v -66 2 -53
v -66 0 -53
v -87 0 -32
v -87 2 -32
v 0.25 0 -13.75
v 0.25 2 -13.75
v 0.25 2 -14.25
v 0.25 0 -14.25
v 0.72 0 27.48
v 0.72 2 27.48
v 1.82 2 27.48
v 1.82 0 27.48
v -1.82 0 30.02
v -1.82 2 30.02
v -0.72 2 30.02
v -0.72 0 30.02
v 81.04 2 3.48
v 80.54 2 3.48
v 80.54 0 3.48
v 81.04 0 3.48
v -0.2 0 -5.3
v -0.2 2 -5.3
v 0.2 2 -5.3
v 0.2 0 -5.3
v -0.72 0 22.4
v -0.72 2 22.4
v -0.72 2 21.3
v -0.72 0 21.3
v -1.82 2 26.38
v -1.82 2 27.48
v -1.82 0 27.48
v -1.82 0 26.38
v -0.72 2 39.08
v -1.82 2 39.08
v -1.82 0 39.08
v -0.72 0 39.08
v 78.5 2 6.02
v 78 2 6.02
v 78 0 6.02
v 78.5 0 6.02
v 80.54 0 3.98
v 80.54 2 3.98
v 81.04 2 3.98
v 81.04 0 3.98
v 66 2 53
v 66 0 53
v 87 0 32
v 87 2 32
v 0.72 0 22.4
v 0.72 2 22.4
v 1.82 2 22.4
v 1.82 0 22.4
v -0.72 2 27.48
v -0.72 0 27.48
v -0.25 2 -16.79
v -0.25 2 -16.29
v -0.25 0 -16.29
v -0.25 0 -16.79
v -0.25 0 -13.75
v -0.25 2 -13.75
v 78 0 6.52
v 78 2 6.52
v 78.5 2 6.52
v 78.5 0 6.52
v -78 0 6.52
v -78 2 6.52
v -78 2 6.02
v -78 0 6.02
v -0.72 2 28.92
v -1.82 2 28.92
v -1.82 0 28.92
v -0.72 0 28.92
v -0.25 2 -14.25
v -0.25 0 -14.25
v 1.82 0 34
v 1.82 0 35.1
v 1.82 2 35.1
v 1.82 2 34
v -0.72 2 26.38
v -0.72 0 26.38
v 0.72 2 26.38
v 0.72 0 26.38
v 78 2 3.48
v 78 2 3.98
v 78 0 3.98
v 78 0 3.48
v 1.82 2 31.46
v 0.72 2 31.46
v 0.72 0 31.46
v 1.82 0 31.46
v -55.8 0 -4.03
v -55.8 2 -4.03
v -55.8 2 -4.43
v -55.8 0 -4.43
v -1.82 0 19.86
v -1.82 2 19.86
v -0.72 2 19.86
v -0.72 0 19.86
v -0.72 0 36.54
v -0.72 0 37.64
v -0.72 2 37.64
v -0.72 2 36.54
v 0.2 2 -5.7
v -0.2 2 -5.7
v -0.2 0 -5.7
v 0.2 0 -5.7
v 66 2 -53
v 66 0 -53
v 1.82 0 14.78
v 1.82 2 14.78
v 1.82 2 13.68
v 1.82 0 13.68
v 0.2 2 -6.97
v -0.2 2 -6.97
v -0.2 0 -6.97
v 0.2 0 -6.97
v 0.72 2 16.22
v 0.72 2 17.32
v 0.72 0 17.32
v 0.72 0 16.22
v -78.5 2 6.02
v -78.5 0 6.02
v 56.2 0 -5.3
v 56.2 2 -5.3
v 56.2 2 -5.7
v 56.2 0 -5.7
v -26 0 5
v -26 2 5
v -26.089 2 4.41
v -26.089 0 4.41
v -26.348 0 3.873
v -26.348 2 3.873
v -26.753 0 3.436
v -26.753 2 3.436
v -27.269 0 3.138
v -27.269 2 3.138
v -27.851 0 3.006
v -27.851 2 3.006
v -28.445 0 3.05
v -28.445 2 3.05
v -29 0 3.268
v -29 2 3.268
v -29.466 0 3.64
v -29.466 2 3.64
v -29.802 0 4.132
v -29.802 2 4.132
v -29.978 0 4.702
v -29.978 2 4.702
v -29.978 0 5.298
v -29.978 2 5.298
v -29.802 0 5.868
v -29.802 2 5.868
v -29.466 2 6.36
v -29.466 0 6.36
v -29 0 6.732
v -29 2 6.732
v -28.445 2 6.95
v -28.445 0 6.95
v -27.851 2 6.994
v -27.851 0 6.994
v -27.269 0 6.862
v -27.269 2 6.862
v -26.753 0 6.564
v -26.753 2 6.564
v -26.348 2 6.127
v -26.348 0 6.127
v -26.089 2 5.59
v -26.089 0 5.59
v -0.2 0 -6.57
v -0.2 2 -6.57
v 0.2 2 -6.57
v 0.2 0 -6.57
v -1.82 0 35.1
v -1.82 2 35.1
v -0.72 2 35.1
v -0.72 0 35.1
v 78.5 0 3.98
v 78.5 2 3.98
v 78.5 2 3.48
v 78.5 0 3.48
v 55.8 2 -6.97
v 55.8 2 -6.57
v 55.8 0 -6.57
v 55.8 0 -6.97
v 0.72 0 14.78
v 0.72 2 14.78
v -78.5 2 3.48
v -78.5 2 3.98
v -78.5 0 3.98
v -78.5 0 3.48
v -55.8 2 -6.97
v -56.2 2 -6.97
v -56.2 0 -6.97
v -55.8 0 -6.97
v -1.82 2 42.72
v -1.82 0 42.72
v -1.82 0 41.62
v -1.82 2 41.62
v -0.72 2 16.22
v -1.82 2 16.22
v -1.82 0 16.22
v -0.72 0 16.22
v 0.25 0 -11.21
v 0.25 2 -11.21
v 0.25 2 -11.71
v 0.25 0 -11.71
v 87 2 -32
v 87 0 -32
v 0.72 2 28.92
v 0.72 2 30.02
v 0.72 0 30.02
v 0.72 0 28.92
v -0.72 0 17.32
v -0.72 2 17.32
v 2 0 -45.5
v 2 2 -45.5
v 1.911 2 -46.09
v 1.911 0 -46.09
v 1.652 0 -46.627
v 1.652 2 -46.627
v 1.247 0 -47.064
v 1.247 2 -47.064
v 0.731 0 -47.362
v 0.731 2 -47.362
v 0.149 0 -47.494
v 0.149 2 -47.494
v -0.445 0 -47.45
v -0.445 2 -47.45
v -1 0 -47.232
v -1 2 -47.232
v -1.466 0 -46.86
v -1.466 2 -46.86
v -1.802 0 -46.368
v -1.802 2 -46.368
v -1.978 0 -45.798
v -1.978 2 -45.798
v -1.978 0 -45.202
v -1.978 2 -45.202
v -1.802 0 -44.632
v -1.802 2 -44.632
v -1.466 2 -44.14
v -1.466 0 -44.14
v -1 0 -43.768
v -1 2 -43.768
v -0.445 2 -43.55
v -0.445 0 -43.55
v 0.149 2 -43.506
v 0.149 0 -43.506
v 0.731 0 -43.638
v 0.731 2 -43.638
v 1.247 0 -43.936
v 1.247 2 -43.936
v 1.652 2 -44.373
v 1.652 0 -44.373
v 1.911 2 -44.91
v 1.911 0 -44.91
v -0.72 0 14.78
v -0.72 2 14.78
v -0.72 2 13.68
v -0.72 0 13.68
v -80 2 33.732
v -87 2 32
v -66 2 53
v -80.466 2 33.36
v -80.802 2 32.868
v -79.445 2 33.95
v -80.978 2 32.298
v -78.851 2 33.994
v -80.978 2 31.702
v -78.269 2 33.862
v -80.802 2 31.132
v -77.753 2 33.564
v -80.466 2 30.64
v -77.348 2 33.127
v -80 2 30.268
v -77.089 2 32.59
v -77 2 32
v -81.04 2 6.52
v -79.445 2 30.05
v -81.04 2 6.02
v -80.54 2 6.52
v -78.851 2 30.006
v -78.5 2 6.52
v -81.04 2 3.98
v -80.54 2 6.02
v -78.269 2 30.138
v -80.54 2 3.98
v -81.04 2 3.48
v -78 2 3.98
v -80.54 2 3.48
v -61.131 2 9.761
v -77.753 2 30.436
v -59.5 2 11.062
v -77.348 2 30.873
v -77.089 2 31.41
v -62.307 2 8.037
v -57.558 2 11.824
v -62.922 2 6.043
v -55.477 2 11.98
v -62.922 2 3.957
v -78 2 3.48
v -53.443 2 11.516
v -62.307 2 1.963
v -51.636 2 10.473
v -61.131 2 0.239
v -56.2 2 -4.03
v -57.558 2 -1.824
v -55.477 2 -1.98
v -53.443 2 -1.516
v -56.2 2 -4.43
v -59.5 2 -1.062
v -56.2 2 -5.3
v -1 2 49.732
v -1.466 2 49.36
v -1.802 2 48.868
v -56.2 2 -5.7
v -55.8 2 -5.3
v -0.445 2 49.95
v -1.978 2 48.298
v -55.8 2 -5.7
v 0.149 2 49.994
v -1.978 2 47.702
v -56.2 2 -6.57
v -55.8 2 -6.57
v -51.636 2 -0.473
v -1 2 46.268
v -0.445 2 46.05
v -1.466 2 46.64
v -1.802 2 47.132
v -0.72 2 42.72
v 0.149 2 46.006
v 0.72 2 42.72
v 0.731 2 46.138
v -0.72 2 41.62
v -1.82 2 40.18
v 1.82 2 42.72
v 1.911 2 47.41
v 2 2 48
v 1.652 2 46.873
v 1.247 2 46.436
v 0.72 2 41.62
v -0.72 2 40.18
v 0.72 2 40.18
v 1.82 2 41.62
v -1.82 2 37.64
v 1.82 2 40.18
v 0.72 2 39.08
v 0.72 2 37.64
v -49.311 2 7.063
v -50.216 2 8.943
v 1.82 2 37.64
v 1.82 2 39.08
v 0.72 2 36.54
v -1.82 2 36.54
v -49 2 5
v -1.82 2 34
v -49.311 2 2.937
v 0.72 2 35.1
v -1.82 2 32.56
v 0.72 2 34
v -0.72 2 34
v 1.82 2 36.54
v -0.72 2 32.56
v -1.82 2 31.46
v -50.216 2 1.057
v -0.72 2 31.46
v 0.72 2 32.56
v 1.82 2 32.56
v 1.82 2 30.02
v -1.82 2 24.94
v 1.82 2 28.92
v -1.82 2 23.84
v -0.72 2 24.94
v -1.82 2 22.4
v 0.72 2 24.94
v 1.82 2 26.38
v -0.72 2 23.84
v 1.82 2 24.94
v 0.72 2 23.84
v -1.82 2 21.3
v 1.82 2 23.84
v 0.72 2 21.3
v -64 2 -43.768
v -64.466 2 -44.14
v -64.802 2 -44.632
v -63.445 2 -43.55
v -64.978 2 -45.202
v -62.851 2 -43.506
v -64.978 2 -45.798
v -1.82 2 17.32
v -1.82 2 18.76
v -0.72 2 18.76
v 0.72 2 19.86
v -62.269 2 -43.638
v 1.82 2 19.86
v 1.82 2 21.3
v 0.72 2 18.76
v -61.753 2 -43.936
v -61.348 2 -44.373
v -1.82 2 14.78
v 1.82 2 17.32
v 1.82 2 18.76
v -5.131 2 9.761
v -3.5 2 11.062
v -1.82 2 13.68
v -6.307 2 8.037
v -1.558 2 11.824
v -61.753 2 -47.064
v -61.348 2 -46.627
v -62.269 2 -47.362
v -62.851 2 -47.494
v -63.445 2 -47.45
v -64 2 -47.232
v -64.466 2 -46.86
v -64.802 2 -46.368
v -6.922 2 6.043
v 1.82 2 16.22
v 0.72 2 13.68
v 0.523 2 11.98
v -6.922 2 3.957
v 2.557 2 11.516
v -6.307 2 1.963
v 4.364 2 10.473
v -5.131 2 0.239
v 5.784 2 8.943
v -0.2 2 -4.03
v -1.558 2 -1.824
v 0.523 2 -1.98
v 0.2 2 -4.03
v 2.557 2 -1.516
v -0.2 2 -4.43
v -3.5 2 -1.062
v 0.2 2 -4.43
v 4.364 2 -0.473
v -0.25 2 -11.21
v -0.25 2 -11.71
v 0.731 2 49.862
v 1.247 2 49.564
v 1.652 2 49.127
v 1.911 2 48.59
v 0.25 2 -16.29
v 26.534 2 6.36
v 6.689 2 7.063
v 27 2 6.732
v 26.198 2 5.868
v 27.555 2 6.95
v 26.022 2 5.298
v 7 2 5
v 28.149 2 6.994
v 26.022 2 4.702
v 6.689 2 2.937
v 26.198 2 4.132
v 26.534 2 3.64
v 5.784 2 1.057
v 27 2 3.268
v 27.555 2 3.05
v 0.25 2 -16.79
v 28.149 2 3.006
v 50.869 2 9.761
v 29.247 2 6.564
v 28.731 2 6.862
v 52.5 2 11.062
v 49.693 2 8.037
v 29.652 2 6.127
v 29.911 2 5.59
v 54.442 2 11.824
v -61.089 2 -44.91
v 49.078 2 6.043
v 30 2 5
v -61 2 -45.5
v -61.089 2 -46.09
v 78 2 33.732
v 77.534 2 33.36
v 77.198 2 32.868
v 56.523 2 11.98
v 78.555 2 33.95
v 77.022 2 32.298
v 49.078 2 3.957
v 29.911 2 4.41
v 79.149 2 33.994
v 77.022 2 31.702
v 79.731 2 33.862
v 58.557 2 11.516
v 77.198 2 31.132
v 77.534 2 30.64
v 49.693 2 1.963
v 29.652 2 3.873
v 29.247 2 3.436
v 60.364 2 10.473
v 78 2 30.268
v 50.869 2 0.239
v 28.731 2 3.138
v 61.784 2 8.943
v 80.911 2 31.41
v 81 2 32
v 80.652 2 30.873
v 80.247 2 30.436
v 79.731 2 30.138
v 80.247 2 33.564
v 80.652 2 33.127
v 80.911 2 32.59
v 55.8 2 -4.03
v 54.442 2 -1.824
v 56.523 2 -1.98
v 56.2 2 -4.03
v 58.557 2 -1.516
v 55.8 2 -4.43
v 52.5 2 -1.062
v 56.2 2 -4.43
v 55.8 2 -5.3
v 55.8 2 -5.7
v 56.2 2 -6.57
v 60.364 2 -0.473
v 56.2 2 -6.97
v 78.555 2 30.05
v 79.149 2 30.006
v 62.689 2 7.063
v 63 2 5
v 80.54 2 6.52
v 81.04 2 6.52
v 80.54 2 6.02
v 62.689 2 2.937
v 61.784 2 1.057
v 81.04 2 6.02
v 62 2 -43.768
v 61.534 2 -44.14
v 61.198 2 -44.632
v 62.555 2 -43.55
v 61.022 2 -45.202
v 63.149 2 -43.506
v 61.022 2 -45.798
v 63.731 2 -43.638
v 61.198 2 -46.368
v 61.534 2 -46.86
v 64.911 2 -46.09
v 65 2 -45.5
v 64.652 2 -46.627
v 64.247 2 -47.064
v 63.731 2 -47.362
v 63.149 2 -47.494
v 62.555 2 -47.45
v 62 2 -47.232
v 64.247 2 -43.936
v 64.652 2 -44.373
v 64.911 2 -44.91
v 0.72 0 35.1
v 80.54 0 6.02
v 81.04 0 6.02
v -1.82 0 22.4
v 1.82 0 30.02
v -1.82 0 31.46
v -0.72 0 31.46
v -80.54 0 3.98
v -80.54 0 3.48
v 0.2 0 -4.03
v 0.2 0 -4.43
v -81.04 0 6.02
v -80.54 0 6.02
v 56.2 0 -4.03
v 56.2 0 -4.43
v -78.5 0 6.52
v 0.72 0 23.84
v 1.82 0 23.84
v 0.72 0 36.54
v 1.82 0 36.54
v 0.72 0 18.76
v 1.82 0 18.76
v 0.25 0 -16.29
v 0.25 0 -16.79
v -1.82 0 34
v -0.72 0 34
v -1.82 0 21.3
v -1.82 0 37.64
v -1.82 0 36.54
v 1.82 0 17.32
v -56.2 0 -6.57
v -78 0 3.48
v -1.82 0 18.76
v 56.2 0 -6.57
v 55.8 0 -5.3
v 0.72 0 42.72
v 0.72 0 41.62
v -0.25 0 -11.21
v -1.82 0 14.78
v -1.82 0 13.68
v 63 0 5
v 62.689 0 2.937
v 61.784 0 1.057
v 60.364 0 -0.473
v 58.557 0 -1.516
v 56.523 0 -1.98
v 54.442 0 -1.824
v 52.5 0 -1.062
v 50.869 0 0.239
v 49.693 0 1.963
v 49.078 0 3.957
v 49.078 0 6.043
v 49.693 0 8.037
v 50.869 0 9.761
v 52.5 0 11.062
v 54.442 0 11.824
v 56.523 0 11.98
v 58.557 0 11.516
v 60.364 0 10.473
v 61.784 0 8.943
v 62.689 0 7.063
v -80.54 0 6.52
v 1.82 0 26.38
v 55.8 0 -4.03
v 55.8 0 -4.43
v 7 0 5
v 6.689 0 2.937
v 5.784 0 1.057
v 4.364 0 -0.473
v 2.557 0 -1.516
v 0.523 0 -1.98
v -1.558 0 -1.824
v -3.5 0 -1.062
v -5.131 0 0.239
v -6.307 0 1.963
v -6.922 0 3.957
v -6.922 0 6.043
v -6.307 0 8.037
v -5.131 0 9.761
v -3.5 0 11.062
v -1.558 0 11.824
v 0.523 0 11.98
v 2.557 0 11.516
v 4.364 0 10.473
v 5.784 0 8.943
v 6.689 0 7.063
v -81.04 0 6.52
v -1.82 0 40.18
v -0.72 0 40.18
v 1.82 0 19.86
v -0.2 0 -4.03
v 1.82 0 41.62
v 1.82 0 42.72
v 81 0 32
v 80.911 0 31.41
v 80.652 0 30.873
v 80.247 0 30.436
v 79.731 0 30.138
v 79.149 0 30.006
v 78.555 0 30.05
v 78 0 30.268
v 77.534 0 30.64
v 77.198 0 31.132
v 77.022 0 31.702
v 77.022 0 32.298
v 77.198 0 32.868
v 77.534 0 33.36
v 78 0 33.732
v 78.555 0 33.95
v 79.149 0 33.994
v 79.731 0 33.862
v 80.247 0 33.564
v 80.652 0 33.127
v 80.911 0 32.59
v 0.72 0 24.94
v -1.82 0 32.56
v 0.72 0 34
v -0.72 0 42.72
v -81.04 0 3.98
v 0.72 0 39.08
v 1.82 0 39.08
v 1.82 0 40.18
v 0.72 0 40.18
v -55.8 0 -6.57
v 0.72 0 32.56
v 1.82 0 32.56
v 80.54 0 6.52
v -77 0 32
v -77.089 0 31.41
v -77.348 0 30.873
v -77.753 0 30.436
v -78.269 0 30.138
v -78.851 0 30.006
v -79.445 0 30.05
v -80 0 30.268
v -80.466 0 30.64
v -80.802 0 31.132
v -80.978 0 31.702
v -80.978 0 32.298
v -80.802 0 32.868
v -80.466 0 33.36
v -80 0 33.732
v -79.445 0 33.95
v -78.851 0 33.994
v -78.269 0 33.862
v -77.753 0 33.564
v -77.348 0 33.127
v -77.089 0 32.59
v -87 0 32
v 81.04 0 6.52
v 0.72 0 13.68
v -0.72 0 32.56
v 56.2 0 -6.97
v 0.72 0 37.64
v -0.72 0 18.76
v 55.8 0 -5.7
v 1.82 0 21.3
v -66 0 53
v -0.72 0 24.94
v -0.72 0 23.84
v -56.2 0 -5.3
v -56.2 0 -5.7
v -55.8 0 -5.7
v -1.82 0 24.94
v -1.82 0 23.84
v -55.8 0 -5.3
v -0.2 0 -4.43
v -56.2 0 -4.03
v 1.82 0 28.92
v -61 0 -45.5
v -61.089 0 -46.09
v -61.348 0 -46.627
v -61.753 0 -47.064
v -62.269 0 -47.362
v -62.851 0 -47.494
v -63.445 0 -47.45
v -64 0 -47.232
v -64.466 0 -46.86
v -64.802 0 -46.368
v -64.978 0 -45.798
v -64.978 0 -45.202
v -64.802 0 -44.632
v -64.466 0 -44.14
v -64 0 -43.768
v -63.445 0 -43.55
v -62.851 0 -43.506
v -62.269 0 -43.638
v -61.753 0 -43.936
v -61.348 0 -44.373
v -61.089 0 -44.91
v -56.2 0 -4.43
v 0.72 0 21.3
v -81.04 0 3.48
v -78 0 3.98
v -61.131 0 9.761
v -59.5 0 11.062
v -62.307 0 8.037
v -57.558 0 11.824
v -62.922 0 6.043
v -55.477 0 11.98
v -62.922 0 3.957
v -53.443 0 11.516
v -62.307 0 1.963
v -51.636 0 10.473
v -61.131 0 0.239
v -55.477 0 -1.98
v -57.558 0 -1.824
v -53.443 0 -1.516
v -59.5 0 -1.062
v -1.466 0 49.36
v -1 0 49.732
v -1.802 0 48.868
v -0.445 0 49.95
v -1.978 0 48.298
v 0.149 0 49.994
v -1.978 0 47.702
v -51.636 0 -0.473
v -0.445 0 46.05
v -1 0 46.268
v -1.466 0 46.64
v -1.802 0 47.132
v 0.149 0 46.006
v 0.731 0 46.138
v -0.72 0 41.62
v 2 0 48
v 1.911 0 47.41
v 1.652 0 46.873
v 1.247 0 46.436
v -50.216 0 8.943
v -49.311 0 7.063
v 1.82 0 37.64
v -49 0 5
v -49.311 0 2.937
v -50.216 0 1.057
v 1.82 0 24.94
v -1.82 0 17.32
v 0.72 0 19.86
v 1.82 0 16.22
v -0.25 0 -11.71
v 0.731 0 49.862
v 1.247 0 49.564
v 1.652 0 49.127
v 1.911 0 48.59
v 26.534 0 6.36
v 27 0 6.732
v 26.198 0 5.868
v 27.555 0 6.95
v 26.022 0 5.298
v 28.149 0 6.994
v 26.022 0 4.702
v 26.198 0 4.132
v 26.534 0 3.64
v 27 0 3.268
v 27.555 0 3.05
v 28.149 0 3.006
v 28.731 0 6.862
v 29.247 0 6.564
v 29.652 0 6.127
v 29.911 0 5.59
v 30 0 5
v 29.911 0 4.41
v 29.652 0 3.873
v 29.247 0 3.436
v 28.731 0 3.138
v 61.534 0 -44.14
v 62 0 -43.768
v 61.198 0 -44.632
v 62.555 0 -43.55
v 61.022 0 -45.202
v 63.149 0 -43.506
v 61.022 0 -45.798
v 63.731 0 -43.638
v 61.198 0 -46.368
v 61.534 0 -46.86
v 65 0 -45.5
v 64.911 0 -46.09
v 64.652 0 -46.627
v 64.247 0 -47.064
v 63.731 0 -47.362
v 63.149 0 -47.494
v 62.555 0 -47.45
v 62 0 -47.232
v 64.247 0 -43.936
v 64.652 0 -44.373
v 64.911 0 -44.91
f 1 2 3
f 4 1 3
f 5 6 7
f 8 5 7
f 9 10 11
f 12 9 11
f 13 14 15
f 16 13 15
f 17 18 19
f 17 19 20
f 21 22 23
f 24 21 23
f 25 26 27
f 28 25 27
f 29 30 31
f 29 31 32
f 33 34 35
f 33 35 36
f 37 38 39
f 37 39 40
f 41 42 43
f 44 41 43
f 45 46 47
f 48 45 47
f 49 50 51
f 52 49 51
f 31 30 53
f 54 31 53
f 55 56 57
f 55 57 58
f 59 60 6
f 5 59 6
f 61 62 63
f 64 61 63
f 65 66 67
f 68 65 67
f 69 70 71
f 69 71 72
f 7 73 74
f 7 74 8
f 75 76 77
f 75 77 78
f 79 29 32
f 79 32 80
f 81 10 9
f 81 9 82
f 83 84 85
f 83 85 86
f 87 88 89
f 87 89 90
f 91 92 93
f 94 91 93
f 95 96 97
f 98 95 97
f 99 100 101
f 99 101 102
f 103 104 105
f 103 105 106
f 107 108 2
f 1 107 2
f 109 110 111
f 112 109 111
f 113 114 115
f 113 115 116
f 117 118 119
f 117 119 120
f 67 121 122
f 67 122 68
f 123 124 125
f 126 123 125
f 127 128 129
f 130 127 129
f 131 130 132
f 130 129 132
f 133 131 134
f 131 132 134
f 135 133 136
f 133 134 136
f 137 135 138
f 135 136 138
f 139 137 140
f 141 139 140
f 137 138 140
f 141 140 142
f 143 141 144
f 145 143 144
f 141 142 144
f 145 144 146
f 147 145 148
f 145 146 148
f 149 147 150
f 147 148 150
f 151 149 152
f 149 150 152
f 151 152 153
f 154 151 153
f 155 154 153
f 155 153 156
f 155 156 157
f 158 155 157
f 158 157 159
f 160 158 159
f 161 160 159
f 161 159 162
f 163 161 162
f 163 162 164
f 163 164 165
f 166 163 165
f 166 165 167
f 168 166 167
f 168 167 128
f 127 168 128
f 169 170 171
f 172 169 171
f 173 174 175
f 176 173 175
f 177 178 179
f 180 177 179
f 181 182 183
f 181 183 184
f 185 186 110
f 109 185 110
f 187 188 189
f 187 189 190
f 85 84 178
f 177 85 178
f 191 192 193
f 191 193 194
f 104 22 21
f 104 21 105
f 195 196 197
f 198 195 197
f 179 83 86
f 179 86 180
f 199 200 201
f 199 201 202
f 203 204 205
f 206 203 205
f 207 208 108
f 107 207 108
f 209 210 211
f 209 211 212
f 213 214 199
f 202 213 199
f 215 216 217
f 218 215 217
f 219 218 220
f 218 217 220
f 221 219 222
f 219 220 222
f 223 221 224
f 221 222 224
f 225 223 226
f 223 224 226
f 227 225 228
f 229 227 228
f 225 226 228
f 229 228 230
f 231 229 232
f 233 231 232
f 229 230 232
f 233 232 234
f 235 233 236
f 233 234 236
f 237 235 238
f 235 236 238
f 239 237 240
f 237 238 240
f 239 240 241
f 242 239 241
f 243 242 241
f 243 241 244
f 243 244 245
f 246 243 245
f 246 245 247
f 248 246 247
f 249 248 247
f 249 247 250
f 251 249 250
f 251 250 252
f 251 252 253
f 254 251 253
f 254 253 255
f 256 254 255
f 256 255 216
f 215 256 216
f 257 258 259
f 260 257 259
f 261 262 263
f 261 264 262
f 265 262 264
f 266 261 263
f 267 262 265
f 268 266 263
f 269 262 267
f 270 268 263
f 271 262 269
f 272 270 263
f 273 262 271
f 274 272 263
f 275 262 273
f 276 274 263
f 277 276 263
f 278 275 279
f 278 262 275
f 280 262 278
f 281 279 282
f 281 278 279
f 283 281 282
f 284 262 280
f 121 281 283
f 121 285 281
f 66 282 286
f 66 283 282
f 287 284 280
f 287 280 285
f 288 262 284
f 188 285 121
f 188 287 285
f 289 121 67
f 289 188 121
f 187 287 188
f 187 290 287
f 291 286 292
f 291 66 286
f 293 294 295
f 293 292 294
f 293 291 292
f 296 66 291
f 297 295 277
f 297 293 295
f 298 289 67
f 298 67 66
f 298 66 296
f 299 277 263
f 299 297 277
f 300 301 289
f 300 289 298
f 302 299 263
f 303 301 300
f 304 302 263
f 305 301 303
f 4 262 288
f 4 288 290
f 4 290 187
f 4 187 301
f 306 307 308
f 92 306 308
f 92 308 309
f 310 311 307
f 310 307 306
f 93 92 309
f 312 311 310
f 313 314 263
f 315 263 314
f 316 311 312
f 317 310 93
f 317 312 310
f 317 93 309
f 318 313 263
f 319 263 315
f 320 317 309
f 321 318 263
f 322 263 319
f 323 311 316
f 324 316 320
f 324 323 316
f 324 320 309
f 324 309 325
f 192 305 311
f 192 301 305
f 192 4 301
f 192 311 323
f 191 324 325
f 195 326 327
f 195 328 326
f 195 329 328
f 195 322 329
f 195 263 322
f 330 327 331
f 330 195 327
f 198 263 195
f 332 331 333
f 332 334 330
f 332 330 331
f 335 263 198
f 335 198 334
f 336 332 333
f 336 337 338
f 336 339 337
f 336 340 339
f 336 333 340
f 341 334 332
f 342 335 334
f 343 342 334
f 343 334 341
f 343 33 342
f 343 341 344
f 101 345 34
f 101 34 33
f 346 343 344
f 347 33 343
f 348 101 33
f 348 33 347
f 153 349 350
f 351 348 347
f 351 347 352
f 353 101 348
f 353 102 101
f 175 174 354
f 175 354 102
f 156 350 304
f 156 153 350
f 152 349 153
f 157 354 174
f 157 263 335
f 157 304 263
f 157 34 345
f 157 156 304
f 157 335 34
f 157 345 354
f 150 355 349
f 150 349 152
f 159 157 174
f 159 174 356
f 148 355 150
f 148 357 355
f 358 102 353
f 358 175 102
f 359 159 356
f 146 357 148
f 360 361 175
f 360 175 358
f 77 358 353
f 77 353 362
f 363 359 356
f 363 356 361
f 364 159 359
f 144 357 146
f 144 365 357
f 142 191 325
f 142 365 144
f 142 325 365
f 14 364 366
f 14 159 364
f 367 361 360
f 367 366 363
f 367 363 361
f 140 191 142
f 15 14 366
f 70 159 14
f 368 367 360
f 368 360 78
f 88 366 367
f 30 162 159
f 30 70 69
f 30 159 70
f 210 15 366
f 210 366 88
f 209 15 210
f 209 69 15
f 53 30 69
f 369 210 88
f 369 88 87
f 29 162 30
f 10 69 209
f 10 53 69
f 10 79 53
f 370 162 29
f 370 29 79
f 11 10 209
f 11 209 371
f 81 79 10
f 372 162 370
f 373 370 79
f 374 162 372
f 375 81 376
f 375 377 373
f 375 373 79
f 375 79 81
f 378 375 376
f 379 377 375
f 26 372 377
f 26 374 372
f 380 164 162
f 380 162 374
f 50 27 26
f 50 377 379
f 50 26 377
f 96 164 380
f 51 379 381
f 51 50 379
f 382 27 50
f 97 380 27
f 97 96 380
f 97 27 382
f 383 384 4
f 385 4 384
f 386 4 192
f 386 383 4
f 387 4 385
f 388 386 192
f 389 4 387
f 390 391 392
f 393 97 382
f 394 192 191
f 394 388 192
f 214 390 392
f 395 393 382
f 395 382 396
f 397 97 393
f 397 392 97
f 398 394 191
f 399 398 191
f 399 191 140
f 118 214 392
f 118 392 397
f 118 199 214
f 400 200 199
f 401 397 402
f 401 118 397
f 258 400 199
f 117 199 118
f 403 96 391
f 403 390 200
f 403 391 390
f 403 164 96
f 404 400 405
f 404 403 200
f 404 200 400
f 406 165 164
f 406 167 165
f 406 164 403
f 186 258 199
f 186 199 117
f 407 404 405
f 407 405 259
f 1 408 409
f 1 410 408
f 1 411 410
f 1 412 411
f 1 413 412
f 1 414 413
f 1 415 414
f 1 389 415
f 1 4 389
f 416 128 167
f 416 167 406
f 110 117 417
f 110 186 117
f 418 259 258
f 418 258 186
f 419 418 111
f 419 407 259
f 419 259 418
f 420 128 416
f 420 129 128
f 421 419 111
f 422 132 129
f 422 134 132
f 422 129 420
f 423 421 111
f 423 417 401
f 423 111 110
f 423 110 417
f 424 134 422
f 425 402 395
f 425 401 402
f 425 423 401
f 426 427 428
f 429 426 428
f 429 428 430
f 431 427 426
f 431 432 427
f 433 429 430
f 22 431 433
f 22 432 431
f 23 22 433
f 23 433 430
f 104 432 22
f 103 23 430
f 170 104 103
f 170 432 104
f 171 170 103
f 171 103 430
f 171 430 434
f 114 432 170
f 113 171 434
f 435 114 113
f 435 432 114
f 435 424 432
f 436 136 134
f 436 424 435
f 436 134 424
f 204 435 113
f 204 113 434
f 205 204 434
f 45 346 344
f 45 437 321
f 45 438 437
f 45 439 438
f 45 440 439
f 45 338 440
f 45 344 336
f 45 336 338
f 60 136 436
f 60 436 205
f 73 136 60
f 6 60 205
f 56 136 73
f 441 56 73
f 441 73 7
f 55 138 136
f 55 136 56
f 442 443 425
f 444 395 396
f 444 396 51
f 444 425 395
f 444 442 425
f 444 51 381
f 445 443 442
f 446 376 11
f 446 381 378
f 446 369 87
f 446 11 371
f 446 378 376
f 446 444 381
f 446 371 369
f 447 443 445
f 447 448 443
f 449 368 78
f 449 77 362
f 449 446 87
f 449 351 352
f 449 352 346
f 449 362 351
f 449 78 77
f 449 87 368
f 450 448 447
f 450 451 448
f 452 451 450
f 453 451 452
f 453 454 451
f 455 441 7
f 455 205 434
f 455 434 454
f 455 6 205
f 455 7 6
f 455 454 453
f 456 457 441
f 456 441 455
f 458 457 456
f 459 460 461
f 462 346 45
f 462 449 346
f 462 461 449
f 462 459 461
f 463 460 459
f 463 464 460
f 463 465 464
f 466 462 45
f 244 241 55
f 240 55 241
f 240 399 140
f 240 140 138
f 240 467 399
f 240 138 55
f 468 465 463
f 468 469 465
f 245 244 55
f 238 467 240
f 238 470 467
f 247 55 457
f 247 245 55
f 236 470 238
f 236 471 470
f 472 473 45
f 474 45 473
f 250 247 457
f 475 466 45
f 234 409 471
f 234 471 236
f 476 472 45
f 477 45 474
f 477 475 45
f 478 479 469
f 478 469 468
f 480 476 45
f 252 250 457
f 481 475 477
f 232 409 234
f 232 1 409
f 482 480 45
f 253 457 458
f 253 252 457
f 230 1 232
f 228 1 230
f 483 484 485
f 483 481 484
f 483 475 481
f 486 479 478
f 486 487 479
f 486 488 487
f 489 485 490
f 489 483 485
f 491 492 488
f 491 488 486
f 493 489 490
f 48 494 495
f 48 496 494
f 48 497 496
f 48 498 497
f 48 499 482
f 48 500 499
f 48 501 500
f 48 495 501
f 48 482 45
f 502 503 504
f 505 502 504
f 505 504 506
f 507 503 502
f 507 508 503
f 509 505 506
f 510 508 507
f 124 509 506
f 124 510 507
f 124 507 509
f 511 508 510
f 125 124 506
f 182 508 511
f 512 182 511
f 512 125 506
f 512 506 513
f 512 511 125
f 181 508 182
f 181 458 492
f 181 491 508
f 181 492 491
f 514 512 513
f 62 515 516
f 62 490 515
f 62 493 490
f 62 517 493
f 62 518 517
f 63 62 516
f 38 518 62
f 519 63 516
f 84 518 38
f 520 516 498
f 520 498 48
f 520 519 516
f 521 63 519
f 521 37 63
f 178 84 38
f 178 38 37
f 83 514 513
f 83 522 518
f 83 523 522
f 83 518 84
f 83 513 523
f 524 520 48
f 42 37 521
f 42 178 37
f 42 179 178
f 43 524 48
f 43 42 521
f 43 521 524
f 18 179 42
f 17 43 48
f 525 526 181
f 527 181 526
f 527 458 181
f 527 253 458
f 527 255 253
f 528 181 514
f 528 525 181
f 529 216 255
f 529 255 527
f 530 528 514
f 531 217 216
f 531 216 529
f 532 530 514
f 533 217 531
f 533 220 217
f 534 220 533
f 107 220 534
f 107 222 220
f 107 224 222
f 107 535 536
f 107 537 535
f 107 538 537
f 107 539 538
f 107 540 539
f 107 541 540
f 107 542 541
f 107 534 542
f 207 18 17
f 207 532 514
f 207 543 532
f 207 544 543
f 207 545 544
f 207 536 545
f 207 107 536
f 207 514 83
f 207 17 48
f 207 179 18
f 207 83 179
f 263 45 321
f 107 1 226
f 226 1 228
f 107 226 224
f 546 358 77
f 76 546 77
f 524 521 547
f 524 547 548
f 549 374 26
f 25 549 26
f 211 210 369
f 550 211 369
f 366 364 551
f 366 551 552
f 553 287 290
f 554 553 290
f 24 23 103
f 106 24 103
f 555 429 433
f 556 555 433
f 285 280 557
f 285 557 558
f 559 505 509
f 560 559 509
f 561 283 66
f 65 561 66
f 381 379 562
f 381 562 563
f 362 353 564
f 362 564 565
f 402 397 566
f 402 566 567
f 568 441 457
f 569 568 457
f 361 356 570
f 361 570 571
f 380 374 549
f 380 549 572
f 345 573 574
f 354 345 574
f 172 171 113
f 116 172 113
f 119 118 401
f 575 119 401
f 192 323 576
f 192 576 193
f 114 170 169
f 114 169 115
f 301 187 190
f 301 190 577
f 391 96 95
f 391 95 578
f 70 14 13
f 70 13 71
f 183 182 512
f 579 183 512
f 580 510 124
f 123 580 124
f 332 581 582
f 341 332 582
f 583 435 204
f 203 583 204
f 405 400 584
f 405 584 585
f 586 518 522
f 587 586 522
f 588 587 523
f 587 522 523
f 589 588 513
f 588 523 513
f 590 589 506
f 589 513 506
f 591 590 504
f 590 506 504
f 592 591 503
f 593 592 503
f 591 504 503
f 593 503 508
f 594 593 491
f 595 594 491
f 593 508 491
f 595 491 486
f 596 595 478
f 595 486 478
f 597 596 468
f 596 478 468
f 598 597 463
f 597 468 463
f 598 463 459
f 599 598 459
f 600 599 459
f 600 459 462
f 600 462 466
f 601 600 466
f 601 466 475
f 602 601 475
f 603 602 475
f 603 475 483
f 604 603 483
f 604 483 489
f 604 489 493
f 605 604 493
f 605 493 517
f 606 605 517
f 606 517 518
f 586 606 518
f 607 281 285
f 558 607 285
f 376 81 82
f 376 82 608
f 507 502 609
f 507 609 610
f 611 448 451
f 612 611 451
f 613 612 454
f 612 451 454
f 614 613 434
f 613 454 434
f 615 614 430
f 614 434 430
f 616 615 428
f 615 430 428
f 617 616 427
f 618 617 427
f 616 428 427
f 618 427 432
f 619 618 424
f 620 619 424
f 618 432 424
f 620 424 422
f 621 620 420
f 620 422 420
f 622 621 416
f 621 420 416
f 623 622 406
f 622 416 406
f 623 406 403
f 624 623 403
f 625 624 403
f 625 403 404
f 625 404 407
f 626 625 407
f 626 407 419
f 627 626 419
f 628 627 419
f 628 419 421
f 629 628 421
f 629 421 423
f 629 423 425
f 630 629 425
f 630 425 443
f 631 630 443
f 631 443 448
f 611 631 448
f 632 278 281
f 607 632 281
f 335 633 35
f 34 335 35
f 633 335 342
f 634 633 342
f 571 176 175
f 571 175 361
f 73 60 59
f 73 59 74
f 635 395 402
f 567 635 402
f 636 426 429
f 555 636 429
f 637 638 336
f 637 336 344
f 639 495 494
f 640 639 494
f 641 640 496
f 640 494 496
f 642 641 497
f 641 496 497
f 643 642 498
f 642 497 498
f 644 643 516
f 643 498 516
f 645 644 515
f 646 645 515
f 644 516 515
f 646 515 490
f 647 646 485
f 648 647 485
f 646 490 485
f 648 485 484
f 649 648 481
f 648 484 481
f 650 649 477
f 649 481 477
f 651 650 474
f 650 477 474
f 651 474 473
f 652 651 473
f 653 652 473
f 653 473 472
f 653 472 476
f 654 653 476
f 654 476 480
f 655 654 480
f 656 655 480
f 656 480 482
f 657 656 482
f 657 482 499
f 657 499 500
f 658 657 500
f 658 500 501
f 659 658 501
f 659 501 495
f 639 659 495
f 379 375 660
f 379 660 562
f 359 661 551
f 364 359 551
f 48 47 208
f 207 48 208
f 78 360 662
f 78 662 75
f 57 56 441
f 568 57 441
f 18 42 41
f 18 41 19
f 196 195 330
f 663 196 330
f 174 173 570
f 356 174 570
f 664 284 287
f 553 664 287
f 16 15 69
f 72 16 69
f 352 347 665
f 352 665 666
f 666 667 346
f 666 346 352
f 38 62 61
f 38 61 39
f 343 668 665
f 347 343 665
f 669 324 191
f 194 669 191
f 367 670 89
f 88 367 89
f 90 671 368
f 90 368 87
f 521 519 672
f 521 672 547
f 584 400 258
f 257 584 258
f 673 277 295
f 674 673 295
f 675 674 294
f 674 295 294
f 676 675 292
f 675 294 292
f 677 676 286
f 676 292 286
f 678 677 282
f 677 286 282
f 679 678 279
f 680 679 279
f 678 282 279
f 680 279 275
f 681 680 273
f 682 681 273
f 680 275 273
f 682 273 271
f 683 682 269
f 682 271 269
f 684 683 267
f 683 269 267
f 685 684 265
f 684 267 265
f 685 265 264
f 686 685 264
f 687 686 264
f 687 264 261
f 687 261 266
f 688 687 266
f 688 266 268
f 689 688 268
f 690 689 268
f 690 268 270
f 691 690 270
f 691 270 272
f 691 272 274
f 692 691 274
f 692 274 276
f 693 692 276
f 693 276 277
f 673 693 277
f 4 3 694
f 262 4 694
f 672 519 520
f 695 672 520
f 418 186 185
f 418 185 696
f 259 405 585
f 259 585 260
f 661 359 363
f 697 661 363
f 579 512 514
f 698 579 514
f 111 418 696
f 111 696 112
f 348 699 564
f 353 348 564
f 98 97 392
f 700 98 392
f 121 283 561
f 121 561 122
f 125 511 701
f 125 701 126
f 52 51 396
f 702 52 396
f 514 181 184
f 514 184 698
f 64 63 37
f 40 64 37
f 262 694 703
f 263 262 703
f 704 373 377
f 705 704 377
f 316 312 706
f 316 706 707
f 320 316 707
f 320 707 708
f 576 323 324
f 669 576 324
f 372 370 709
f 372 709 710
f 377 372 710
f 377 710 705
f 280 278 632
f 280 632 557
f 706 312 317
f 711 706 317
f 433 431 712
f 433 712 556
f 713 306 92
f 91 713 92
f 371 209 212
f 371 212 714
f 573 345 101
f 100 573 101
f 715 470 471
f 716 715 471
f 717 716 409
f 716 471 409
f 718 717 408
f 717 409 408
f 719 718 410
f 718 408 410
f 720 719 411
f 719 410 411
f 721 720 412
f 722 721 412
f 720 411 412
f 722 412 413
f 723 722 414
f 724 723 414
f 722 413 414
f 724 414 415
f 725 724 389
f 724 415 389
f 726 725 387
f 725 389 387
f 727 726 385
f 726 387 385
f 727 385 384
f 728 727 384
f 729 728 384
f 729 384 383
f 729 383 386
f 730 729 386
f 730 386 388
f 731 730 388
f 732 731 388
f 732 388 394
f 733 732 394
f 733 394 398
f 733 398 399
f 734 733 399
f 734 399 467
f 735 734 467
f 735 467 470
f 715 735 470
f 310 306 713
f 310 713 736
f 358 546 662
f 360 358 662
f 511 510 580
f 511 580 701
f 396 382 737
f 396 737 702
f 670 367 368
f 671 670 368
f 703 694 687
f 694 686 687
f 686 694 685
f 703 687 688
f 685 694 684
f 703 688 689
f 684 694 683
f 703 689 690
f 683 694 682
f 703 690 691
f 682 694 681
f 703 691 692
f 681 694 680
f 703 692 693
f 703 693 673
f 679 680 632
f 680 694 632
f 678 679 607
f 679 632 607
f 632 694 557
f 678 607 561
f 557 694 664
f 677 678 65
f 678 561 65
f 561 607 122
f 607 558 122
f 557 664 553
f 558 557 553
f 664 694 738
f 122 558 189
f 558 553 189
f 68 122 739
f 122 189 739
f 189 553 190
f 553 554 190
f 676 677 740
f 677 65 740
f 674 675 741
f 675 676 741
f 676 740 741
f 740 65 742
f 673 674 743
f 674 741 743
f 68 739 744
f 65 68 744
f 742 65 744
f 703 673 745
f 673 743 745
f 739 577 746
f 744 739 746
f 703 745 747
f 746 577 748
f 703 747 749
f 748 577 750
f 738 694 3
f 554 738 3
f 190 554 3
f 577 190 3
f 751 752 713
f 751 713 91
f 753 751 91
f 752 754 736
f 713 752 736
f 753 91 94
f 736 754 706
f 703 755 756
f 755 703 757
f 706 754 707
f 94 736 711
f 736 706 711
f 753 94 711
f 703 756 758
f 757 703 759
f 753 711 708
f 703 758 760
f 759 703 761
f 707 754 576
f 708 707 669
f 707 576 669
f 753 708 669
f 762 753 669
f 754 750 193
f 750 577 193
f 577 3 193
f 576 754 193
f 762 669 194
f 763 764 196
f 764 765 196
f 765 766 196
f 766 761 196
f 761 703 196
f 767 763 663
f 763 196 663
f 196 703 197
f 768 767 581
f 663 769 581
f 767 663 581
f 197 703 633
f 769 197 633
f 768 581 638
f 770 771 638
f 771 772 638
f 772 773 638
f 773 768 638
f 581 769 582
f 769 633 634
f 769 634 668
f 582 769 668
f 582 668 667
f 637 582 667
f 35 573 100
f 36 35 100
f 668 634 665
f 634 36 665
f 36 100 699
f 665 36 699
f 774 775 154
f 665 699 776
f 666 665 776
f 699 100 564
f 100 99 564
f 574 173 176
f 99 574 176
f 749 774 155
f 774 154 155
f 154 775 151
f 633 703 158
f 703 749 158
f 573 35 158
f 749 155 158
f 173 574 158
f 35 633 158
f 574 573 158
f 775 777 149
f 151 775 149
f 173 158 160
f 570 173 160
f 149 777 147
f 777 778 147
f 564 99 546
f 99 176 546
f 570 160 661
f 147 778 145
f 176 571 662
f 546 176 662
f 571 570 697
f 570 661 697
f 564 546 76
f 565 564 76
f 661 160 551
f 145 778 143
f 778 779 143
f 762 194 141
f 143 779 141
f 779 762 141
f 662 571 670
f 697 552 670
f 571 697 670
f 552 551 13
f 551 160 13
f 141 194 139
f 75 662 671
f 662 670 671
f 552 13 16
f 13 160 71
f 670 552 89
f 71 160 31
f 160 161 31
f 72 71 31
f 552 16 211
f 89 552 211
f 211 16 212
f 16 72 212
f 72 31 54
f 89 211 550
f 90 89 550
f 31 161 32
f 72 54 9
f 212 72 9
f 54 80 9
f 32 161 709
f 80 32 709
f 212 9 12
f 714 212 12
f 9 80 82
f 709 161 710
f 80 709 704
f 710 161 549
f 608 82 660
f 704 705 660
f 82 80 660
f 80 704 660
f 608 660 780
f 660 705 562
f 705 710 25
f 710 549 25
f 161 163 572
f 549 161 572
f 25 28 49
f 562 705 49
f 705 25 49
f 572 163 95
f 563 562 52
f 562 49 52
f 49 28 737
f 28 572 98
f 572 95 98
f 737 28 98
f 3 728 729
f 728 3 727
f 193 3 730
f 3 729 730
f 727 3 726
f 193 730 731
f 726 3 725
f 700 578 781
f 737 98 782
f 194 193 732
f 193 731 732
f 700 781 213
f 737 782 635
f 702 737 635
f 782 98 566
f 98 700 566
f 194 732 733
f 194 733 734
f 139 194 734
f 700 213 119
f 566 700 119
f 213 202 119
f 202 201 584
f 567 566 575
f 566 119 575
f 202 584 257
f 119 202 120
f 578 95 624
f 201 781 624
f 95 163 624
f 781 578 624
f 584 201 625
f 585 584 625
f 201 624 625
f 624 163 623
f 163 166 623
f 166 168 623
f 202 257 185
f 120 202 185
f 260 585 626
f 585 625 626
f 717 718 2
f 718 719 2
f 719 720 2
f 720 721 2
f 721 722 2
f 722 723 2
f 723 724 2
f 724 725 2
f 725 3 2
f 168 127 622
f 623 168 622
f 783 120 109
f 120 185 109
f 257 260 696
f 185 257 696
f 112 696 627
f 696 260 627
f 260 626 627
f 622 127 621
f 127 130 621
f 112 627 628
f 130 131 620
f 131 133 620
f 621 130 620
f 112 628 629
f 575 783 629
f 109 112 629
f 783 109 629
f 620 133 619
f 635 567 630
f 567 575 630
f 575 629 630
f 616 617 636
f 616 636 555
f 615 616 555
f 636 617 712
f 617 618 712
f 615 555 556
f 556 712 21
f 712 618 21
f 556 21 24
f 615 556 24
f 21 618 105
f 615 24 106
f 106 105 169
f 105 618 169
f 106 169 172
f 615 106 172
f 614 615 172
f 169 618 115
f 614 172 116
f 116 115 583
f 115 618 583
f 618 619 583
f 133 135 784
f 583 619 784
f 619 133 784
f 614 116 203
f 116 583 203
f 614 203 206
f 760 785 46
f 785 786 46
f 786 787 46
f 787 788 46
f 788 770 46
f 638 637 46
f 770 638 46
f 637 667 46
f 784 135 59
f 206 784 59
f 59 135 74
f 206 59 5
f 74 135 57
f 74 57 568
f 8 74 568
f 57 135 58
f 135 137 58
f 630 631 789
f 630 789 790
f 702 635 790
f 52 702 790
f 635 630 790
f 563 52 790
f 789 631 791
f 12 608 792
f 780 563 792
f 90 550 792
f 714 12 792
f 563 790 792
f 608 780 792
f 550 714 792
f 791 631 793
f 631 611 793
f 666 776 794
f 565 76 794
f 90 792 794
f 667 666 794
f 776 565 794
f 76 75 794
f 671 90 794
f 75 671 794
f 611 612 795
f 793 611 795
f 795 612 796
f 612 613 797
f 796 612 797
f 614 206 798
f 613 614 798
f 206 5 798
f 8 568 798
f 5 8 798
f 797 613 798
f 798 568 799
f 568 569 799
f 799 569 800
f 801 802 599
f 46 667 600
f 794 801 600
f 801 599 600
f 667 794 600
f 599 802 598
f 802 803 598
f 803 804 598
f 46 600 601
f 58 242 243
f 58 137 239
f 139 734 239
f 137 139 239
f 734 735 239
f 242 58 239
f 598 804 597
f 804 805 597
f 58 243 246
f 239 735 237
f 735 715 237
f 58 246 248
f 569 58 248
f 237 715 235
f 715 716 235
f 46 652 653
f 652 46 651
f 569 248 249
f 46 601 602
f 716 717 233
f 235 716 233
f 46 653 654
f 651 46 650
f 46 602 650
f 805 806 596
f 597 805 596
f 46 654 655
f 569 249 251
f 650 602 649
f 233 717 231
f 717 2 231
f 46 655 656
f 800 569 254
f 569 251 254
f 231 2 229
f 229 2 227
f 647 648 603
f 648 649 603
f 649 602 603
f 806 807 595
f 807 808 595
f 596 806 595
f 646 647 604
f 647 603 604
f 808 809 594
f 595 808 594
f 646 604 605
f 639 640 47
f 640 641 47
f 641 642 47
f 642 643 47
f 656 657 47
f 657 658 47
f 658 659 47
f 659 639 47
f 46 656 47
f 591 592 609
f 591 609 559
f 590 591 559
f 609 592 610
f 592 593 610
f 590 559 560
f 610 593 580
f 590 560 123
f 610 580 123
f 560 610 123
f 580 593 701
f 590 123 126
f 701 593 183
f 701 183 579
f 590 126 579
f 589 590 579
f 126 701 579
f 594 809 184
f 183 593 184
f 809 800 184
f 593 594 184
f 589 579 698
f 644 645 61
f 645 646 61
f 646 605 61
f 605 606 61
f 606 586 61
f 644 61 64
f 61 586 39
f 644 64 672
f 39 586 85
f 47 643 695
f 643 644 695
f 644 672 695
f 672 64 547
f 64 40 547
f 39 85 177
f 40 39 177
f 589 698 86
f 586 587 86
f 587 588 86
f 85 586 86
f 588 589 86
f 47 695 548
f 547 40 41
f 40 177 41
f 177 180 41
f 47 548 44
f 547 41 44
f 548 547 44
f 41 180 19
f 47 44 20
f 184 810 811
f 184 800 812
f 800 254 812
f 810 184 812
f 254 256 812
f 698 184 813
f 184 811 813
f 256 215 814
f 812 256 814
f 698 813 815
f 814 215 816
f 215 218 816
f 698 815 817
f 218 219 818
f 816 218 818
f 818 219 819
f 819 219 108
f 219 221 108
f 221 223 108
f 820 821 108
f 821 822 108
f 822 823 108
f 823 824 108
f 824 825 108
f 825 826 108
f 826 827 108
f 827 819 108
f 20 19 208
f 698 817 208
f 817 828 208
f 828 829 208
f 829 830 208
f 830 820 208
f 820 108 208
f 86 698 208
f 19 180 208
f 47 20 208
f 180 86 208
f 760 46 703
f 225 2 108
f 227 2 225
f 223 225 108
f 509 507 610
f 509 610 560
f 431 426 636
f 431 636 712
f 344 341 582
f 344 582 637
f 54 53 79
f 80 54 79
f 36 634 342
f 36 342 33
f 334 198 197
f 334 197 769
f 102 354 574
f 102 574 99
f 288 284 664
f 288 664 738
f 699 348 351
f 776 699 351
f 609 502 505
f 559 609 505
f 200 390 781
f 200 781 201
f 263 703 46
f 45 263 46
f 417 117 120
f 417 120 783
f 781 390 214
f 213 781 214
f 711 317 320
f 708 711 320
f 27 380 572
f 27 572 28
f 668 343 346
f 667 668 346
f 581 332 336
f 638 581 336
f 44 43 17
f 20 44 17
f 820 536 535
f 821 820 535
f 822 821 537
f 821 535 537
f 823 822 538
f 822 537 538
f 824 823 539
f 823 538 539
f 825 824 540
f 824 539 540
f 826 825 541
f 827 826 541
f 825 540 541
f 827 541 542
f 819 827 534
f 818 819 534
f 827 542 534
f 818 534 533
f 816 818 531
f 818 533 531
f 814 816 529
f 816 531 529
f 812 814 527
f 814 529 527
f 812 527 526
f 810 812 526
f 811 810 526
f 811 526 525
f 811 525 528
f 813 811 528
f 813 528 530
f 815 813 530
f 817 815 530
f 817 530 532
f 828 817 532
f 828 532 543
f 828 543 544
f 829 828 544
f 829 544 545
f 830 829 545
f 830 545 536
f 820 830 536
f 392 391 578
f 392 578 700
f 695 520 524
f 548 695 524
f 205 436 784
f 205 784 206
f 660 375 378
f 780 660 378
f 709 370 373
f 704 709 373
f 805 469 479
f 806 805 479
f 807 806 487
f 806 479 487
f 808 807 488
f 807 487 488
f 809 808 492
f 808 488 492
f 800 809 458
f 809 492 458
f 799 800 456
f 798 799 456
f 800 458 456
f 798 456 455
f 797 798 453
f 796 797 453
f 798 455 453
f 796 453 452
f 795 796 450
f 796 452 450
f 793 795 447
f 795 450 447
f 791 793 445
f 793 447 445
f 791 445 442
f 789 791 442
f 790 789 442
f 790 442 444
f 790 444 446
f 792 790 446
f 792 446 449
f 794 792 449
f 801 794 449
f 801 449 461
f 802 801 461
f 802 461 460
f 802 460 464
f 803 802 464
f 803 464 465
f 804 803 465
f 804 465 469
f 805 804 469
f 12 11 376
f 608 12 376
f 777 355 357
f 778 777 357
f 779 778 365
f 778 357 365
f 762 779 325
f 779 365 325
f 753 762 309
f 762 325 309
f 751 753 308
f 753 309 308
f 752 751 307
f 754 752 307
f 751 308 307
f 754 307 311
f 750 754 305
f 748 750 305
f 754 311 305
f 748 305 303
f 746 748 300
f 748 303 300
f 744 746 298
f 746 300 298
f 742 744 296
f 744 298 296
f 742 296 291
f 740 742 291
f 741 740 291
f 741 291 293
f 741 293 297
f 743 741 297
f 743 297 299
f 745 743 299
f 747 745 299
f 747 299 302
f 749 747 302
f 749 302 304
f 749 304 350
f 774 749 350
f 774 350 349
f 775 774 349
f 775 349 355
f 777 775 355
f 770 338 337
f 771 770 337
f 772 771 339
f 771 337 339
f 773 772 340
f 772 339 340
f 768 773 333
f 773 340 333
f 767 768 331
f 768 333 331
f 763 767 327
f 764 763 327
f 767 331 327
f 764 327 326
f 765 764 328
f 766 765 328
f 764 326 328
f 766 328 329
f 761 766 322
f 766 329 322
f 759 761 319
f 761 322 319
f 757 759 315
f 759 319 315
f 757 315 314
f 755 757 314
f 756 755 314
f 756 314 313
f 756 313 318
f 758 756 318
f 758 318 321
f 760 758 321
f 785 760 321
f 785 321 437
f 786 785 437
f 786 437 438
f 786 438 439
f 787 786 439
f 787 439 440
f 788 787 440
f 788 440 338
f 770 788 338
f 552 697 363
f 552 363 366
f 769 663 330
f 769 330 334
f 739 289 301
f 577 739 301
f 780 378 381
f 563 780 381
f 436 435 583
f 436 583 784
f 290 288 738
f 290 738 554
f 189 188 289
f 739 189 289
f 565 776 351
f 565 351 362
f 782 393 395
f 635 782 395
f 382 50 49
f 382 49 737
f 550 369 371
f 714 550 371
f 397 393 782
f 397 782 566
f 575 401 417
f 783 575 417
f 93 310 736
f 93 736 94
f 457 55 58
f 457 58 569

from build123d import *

# Parameters (mm, degrees)
EXTRUDE_1_DEPTH     = 2
SKETCH_7_R          = 7
CUT_EXTRUDE_3_DEPTH = 3
SKETCH_2_R          = 2
CUT_EXTRUDE_4_DEPTH = 3
SKETCH_8_W          = 1.1
SKETCH_8_H          = 1.1
CUT_EXTRUDE_5_DEPTH = 10
SKETCH_9_W          = 0.5
SKETCH_9_H          = 0.5
SKETCH_9_W_2        = 0.4
SKETCH_9_H_2        = 0.4
CUT_EXTRUDE_6_DEPTH = 10


with BuildPart() as part:
    # 草图1 → 凸台-拉伸1 (new body)
    with BuildSketch(Plane(origin=(0, 0, 0), x_dir=(1, 0, 0), z_dir=(0, 1, 0))):
        Polygon((-66, 53), (-87, 32), (-87, -32), (-66, -53), (66, -53), (87, -32), (87, 32), (66, 53), align=None)
    extrude(amount=EXTRUDE_1_DEPTH)

    # 草图7 → 切除-拉伸3 (cut, through all)
    with BuildSketch(Plane(origin=(0, 2, 0), x_dir=(1, 0, 0), z_dir=(0, 1, 0))):
        with Locations((-56, -5)):
            Circle(SKETCH_7_R)
        with Locations((0, -5)):
            Circle(SKETCH_7_R)
        with Locations((56, -5)):
            Circle(SKETCH_7_R)
    extrude(amount=-CUT_EXTRUDE_3_DEPTH, mode=Mode.SUBTRACT)

    # 草图2 → 切除-拉伸4 (cut, through all)
    with BuildSketch(Plane(origin=(0, 2, 0), x_dir=(1, 0, 0), z_dir=(0, 1, 0))):
        with Locations((-63, 45.5)):
            Circle(SKETCH_2_R)
        with Locations((0, 45.5)):
            Circle(SKETCH_2_R)
        with Locations((63, 45.5)):
            Circle(SKETCH_2_R)
        with Locations((28, -5)):
            Circle(SKETCH_2_R)
        with Locations((-28, -5)):
            Circle(SKETCH_2_R)
        with Locations((-79, -32)):
            Circle(SKETCH_2_R)
        with Locations((0, -48)):
            Circle(SKETCH_2_R)
        with Locations((79, -32)):
            Circle(SKETCH_2_R)
    extrude(amount=-CUT_EXTRUDE_4_DEPTH, mode=Mode.SUBTRACT)

    # 草图8 → 切除-拉伸5 (cut)
    with BuildSketch(Plane(origin=(0, 2, 0), x_dir=(1, 0, 0), z_dir=(0, 1, 0))):
        with Locations((-1.27, -32.01)):
            Rectangle(SKETCH_8_W, SKETCH_8_H)
        with Locations((-1.27, -34.55)):
            Rectangle(SKETCH_8_W, SKETCH_8_H)
        with Locations((-1.27, -37.09)):
            Rectangle(SKETCH_8_W, SKETCH_8_H)
        with Locations((-1.27, -39.63)):
            Rectangle(SKETCH_8_W, SKETCH_8_H)
        with Locations((1.27, -14.23)):
            Rectangle(SKETCH_8_W, SKETCH_8_H)
        with Locations((1.27, -16.77)):
            Rectangle(SKETCH_8_W, SKETCH_8_H)
        with Locations((1.27, -19.31)):
            Rectangle(SKETCH_8_W, SKETCH_8_H)
        with Locations((1.27, -21.85)):
            Rectangle(SKETCH_8_W, SKETCH_8_H)
        with Locations((1.27, -24.39)):
            Rectangle(SKETCH_8_W, SKETCH_8_H)
        with Locations((1.27, -26.93)):
            Rectangle(SKETCH_8_W, SKETCH_8_H)
        with Locations((1.27, -29.47)):
            Rectangle(SKETCH_8_W, SKETCH_8_H)
        with Locations((1.27, -32.01)):
            Rectangle(SKETCH_8_W, SKETCH_8_H)
        with Locations((1.27, -34.55)):
            Rectangle(SKETCH_8_W, SKETCH_8_H)
        with Locations((1.27, -37.09)):
            Rectangle(SKETCH_8_W, SKETCH_8_H)
        with Locations((1.27, -39.63)):
            Rectangle(SKETCH_8_W, SKETCH_8_H)
        with Locations((1.27, -42.17)):
            Rectangle(SKETCH_8_W, SKETCH_8_H)
        with Locations((-1.27, -29.47)):
            Rectangle(SKETCH_8_W, SKETCH_8_H)
        with Locations((-1.27, -26.93)):
            Rectangle(SKETCH_8_W, SKETCH_8_H)
        with Locations((-1.27, -24.39)):
            Rectangle(SKETCH_8_W, SKETCH_8_H)
        with Locations((-1.27, -21.85)):
            Rectangle(SKETCH_8_W, SKETCH_8_H)
        with Locations((-1.27, -19.31)):
            Rectangle(SKETCH_8_W, SKETCH_8_H)
        with Locations((-1.27, -16.77)):
            Rectangle(SKETCH_8_W, SKETCH_8_H)
        with Locations((-1.27, -14.23)):
            Rectangle(SKETCH_8_W, SKETCH_8_H)
        with Locations((-1.27, -42.17)):
            Rectangle(SKETCH_8_W, SKETCH_8_H)
    extrude(amount=-CUT_EXTRUDE_5_DEPTH, mode=Mode.SUBTRACT)

    # 草图9 → 切除-拉伸6 (cut)
    with BuildSketch(Plane(origin=(0, 2, 0), x_dir=(1, 0, 0), z_dir=(0, 1, 0))):
        with Locations((80.789998711, -3.729993265)):
            Rectangle(SKETCH_9_W, SKETCH_9_H)
        with Locations((78.250005425, -3.729993265)):
            Rectangle(SKETCH_9_W, SKETCH_9_H)
        with Locations((78.250005647, -6.269993265)):
            Rectangle(SKETCH_9_W, SKETCH_9_H)
        with Locations((80.789998933, -6.269993265)):
            Rectangle(SKETCH_9_W, SKETCH_9_H)
        with Locations((5.668e-06, 16.540004272)):
            Rectangle(SKETCH_9_W, SKETCH_9_H)
        with Locations((5.668e-06, 13.999995727)):
            Rectangle(SKETCH_9_W, SKETCH_9_H)
        with Locations((5.668e-06, 11.460002441)):
            Rectangle(SKETCH_9_W, SKETCH_9_H)
        with Locations((-80.789998889, -3.730006779)):
            Rectangle(SKETCH_9_W, SKETCH_9_H)
        with Locations((-78.250005603, -3.730006779)):
            Rectangle(SKETCH_9_W, SKETCH_9_H)
        with Locations((-80.789998667, -6.270006779)):
            Rectangle(SKETCH_9_W, SKETCH_9_H)
        with Locations((-78.250005381, -6.270006779)):
            Rectangle(SKETCH_9_W, SKETCH_9_H)
        with Locations((56, 6.77)):
            Rectangle(SKETCH_9_W_2, SKETCH_9_H_2)
        with Locations((56, 5.5)):
            Rectangle(SKETCH_9_W_2, SKETCH_9_H_2)
        with Locations((56, 4.23)):
            Rectangle(SKETCH_9_W_2, SKETCH_9_H_2)
        with Locations((0, 6.77)):
            Rectangle(SKETCH_9_W_2, SKETCH_9_H_2)
        with Locations((0, 5.5)):
            Rectangle(SKETCH_9_W_2, SKETCH_9_H_2)
        with Locations((0, 4.23)):
            Rectangle(SKETCH_9_W_2, SKETCH_9_H_2)
        with Locations((-56, 6.77)):
            Rectangle(SKETCH_9_W_2, SKETCH_9_H_2)
        with Locations((-56, 5.5)):
            Rectangle(SKETCH_9_W_2, SKETCH_9_H_2)
        with Locations((-56, 4.23)):
            Rectangle(SKETCH_9_W_2, SKETCH_9_H_2)
    extrude(amount=-CUT_EXTRUDE_6_DEPTH, mode=Mode.SUBTRACT)


solid = part.part
